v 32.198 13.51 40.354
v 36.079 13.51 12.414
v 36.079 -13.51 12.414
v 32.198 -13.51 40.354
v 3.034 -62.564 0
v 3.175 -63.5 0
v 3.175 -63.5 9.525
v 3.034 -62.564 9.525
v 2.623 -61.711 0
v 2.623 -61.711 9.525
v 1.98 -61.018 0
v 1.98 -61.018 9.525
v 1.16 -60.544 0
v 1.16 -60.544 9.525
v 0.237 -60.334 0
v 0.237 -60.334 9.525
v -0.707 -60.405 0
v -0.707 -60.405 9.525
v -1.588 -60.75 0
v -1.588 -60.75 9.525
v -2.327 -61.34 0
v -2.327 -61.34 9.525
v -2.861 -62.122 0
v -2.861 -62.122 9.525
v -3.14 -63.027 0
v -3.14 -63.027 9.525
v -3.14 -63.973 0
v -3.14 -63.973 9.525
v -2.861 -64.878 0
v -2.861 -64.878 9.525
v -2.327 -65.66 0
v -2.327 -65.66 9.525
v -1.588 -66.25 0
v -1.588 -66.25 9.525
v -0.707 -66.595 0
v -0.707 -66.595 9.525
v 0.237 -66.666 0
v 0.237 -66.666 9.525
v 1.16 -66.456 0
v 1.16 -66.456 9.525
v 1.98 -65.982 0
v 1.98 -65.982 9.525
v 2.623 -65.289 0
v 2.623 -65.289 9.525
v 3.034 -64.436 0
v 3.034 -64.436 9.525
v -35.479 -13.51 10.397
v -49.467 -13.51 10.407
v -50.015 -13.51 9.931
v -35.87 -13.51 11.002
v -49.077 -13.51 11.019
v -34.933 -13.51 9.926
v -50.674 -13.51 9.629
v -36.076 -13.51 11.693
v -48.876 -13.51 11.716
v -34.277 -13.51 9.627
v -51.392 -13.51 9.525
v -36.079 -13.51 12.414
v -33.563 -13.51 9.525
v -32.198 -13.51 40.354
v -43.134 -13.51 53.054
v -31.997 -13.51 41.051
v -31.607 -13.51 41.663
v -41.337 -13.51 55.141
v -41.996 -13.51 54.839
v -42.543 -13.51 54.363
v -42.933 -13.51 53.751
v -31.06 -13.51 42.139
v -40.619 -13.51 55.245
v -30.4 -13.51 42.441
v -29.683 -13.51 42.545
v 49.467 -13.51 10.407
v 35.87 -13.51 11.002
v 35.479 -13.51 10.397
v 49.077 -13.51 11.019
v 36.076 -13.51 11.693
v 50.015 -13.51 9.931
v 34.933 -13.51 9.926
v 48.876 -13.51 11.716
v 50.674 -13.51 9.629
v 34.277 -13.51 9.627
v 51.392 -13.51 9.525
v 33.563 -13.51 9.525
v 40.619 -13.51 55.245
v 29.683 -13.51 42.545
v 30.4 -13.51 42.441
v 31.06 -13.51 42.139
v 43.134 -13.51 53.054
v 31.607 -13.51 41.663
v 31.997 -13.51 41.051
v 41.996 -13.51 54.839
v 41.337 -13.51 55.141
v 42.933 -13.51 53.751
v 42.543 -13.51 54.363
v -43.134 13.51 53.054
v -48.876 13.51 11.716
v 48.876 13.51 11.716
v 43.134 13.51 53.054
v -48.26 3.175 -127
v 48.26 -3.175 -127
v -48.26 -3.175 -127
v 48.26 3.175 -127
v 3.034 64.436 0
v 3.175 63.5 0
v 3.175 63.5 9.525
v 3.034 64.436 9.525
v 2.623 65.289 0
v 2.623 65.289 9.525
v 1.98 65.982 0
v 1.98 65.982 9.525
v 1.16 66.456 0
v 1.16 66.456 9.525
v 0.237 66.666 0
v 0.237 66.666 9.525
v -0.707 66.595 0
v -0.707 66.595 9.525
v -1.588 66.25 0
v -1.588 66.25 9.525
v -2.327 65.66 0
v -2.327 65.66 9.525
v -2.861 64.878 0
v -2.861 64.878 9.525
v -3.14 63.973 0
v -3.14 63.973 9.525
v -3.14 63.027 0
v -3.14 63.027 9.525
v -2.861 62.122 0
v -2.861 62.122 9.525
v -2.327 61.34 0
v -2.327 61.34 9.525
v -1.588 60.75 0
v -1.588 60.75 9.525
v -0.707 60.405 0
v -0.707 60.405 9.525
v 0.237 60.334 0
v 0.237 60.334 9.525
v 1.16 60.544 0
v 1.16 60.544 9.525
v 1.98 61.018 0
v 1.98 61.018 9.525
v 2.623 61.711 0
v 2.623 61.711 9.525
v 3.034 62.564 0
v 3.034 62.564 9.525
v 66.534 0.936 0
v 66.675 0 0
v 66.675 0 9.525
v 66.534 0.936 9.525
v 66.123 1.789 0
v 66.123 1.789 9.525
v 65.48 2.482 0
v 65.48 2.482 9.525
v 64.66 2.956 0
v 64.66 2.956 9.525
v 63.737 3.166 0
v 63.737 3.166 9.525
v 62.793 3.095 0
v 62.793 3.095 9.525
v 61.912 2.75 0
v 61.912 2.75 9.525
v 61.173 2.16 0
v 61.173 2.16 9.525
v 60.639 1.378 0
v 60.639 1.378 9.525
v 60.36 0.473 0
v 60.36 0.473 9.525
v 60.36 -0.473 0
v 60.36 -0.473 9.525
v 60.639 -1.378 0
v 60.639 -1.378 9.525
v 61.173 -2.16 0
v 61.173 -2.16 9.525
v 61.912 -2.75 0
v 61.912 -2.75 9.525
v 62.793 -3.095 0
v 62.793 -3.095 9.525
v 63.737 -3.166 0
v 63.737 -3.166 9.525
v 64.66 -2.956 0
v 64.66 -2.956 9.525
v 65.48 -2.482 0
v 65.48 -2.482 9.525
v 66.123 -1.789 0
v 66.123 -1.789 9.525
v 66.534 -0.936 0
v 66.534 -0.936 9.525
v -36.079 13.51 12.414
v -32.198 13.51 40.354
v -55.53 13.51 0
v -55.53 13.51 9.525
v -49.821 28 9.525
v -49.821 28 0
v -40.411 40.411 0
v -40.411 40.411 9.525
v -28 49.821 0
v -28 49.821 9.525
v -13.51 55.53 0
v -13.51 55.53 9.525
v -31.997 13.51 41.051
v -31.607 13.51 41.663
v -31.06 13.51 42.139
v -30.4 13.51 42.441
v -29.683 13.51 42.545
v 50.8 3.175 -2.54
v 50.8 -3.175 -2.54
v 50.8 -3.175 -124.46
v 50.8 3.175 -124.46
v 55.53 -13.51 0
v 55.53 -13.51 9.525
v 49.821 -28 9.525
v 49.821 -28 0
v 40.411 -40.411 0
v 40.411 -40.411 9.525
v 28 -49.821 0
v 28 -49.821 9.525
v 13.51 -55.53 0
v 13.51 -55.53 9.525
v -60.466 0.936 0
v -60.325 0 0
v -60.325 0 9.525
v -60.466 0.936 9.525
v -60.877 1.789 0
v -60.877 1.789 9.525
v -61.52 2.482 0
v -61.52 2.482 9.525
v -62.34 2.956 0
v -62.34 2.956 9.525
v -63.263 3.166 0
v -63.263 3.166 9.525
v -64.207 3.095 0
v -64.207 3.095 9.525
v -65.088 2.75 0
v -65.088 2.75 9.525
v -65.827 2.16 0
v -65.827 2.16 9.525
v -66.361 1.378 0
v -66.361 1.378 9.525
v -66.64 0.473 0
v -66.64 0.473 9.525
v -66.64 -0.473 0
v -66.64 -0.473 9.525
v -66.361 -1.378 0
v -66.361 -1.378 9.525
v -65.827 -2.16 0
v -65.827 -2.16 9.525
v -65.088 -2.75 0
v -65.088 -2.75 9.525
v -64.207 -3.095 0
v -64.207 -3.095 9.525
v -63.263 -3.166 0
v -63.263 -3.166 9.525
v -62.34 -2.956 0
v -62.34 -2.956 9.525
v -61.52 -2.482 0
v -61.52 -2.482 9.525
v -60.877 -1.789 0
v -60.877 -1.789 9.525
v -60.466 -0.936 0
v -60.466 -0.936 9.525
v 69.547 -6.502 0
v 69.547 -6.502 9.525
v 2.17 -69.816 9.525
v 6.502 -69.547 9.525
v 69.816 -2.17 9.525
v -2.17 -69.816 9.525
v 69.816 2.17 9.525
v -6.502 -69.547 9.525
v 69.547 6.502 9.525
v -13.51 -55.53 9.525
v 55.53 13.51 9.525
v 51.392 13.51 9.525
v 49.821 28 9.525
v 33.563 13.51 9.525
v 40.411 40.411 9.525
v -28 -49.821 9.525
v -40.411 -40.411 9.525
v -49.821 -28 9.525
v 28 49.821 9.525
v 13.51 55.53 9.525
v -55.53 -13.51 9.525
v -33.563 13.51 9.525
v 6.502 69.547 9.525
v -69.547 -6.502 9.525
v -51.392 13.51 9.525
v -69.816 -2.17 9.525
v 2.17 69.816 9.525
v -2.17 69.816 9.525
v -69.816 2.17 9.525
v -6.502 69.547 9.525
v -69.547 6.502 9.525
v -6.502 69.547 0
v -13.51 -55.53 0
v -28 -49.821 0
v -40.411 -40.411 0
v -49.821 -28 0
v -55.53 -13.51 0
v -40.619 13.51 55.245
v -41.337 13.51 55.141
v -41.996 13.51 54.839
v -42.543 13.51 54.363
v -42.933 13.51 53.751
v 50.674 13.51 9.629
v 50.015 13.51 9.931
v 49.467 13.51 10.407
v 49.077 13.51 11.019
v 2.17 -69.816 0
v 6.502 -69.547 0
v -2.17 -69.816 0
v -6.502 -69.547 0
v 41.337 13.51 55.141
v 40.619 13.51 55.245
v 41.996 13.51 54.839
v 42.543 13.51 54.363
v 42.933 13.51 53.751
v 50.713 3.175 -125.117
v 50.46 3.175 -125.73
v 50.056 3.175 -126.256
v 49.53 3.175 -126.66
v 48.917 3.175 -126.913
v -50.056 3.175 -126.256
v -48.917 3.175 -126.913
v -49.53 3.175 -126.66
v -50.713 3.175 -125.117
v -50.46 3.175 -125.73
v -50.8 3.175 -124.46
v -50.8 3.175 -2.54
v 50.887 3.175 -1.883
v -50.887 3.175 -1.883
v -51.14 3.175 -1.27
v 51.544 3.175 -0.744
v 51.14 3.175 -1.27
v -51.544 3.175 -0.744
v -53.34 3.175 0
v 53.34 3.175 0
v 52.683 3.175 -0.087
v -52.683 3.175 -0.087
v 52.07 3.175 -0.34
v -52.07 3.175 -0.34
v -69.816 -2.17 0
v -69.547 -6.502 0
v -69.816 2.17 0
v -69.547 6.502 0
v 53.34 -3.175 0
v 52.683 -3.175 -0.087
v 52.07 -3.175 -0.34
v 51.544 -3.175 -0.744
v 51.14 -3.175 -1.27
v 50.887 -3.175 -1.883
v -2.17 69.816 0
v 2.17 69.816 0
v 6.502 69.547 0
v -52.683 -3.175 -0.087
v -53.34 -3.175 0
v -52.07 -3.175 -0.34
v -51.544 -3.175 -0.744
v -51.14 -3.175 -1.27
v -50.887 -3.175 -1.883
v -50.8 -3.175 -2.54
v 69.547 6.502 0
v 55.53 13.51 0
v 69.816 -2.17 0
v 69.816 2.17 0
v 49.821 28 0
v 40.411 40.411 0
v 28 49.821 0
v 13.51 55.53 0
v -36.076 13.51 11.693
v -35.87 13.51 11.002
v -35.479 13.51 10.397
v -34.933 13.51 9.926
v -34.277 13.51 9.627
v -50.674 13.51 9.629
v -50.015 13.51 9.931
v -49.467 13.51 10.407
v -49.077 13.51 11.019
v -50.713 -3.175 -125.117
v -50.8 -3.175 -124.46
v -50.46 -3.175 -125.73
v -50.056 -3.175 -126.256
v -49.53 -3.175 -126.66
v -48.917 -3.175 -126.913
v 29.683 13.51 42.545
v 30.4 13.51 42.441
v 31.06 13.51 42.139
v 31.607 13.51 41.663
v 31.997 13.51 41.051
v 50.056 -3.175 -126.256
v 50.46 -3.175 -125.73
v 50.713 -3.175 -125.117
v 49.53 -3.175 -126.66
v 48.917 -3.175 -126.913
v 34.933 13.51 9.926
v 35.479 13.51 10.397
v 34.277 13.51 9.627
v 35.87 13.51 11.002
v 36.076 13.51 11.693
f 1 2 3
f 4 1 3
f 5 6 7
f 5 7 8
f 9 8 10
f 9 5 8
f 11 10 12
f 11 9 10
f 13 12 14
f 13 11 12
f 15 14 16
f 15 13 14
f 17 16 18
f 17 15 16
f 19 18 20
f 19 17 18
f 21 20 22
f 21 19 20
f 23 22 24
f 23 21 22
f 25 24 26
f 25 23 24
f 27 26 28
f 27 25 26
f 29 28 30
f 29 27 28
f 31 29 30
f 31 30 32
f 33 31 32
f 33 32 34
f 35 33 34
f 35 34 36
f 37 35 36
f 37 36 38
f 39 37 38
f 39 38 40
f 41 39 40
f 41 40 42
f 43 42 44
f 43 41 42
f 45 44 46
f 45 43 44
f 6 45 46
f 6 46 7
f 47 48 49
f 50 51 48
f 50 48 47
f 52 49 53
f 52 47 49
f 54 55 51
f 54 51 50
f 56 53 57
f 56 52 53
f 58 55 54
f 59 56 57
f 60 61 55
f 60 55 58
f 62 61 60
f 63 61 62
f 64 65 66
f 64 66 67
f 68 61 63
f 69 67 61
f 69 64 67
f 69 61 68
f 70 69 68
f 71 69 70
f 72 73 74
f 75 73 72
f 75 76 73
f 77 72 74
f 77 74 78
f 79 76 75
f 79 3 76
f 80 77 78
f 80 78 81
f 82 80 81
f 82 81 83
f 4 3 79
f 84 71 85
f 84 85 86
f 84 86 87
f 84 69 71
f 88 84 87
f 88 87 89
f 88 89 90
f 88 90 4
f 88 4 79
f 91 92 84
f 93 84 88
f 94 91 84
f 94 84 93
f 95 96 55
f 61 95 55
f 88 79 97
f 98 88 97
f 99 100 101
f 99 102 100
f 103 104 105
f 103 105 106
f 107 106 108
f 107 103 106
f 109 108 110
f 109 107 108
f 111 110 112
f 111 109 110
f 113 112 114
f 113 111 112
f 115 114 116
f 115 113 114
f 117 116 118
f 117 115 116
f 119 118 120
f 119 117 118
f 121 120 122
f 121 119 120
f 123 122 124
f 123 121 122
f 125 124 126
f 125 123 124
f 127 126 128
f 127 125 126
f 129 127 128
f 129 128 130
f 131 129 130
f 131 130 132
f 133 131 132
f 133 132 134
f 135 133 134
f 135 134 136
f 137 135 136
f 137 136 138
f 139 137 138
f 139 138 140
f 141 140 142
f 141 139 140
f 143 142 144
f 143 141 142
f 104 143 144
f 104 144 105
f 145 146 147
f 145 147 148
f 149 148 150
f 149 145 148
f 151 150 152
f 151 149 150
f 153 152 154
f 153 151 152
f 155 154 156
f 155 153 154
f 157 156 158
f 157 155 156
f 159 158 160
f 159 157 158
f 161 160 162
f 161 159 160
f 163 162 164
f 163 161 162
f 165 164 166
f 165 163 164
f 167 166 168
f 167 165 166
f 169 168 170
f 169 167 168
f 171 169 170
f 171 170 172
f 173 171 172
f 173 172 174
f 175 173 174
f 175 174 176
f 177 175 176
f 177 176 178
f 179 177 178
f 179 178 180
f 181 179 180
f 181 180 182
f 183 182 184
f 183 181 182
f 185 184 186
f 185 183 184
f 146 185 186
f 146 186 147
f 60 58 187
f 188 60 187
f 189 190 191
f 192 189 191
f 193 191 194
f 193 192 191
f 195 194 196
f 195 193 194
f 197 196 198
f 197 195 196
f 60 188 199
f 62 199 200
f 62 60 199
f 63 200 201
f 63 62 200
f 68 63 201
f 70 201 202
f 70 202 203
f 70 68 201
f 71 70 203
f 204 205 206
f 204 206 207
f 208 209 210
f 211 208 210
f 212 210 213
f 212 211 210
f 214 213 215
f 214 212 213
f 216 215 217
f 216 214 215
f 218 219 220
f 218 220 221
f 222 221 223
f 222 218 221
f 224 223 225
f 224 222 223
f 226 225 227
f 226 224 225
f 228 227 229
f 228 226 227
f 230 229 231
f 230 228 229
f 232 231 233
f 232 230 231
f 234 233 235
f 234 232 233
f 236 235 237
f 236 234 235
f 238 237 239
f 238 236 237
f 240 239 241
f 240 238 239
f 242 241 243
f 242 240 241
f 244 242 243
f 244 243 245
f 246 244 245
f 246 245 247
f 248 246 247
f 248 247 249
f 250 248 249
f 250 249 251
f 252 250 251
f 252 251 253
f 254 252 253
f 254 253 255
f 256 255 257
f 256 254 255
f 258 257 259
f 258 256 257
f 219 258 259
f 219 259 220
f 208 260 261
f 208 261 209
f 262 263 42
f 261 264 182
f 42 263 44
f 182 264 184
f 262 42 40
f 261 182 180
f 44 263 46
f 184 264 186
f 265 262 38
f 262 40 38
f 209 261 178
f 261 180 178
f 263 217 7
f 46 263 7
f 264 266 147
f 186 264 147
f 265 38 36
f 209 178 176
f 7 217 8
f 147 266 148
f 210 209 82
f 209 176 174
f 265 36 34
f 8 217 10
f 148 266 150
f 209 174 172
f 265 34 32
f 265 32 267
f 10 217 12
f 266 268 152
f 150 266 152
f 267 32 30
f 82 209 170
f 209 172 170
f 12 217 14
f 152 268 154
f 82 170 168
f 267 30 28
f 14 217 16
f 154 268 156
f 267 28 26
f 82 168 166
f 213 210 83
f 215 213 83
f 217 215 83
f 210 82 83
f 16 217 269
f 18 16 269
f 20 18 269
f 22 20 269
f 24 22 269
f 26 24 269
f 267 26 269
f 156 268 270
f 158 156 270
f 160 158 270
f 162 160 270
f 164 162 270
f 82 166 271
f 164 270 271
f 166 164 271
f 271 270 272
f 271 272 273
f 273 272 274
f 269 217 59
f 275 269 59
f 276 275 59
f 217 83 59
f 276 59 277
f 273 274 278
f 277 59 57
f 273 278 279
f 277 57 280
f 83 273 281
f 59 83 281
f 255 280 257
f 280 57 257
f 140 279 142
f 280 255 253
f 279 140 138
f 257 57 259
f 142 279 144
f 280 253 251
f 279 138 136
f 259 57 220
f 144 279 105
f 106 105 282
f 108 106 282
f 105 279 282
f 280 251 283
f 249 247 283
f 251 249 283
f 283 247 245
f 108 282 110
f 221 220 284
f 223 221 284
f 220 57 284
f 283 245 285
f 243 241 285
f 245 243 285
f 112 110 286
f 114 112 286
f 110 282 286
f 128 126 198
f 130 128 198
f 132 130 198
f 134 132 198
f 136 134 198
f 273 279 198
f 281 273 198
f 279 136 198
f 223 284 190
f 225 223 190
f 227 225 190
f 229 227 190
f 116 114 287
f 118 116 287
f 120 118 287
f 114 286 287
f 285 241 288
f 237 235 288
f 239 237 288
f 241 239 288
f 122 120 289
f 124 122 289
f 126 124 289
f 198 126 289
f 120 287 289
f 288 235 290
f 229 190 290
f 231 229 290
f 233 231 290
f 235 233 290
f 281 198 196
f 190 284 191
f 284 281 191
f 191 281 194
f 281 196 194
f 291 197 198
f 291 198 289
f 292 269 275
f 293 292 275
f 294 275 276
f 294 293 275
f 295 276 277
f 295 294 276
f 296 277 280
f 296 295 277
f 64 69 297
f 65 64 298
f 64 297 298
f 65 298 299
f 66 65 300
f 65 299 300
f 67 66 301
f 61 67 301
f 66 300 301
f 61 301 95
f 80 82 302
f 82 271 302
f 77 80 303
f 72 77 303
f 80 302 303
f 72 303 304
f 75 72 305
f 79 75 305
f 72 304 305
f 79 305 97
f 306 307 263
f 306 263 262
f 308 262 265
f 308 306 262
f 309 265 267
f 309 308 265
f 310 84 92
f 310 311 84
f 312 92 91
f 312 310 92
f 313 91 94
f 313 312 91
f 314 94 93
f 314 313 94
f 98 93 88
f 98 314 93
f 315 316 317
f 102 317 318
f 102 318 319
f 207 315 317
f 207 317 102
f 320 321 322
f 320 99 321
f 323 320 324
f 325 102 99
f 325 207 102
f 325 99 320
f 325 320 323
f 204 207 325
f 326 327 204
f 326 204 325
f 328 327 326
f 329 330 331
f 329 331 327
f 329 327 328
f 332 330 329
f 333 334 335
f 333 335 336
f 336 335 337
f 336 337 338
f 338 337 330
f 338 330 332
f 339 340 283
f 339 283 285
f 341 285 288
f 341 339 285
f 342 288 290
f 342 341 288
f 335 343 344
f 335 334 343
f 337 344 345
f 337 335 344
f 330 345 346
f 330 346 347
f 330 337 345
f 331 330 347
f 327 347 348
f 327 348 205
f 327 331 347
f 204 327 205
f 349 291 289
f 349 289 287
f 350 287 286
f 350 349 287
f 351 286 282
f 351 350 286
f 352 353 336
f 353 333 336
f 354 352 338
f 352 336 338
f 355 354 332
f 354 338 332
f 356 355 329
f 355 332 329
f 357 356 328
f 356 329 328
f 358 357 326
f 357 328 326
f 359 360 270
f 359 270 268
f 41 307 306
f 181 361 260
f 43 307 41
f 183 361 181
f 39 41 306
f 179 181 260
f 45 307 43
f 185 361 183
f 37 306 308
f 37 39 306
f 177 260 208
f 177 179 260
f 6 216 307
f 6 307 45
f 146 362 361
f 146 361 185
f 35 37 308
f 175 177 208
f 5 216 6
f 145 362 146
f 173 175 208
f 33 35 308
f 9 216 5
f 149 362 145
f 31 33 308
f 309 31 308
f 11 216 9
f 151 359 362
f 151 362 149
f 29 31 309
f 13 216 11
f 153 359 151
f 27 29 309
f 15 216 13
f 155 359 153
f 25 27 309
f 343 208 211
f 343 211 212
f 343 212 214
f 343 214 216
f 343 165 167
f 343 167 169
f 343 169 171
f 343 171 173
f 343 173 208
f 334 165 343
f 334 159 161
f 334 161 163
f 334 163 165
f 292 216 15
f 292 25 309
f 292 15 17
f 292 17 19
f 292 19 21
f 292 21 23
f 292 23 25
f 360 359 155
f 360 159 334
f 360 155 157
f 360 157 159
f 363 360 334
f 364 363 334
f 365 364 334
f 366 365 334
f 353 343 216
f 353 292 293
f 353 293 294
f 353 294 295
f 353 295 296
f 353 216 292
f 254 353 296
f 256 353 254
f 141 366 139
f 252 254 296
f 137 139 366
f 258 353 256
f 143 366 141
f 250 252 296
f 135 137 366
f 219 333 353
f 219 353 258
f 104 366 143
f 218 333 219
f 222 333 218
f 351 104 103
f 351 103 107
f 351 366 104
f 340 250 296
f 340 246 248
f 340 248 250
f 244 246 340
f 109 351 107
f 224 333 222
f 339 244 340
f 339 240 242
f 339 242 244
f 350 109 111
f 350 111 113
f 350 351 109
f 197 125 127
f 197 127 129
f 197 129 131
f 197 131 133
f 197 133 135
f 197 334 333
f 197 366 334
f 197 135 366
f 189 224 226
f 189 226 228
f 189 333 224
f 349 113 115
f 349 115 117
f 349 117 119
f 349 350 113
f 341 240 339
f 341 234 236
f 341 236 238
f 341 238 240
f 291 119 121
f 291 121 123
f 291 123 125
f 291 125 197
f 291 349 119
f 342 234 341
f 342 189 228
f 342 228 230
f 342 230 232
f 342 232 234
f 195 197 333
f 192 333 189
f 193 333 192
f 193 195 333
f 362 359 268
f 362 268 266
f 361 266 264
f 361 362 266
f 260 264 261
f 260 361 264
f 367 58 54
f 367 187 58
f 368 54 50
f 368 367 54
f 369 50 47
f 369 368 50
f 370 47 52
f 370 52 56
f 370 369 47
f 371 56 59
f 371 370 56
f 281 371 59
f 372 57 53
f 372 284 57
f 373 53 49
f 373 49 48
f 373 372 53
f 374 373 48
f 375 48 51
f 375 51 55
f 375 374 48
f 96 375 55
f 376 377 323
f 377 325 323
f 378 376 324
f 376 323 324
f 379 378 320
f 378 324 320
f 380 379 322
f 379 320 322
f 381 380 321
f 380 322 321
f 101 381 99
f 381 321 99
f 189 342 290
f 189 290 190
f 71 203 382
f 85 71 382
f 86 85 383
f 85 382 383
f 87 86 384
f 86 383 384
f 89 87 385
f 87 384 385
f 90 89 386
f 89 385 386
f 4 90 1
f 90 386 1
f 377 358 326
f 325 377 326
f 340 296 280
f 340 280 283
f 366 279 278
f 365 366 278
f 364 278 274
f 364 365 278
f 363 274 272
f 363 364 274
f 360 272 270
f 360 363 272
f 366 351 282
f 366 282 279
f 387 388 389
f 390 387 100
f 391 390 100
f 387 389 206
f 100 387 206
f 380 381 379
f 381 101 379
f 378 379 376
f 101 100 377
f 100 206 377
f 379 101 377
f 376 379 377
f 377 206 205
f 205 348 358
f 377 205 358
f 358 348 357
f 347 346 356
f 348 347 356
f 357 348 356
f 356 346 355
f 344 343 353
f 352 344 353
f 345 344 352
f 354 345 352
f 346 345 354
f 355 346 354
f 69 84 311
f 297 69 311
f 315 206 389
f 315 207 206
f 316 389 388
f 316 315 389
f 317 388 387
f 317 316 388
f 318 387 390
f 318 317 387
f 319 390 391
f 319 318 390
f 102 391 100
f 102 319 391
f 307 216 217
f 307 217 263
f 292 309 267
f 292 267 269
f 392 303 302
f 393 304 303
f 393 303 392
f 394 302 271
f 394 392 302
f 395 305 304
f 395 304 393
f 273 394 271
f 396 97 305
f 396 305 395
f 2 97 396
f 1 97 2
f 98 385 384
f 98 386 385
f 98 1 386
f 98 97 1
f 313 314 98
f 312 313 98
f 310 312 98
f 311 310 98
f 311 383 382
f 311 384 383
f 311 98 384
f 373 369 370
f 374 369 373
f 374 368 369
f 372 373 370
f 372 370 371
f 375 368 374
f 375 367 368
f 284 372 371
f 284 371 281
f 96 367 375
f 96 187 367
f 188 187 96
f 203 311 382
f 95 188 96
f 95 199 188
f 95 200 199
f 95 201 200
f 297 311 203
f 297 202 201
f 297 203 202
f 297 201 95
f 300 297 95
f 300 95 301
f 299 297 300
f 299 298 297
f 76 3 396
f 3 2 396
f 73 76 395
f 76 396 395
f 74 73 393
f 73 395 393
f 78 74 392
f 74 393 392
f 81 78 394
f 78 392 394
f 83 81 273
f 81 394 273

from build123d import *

# Parameters (mm, degrees)
SKETCH2_R           = 3.175
BOSS_EXTRUDE1_DEPTH = 9.525
SKETCH4_W           = 12.7
SKETCH4_H           = 27.0197796
SKETCH9_W           = 12.7
SKETCH9_H           = 27.0197796
SKETCH4_86_W        = 12.7
SKETCH4_86_H        = 27.0197796
SKETCH9_5_W         = 12.7
SKETCH9_5_H         = 27.0197796
SKETCH11_W          = 85.660440798
SKETCH11_H          = 27.0197796
BOSS_EXTRUDE3_DEPTH = 12.7
FILLET2_R           = 2.54
SKETCH12_W          = 101.6
SKETCH12_H          = 6.35
BOSS_EXTRUDE4_DEPTH = 127
FILLET4_R           = 2.54


with BuildPart() as part:
    # Sketch2 → Boss-Extrude1 (new body)
    with BuildSketch(Plane.XY):
        with BuildLine():
            Line((6.501621467, 69.546757065), (13.5098898, 55.530220399))
            ThreePointArc((13.5098898, 55.530220399), (40.411152545, 40.411152545), (55.530220399, 13.5098898))
            Line((55.530220399, 13.5098898), (69.546757065, 6.501621467))
            ThreePointArc((69.546757065, 6.501621467), (69.85, 0), (69.546757065, -6.501621467))
            Line((69.546757065, -6.501621467), (55.530220399, -13.5098898))
            ThreePointArc((55.530220399, -13.5098898), (40.411152545, -40.411152545), (13.5098898, -55.530220399))
            Line((13.5098898, -55.530220399), (6.501621467, -69.546757065))
            ThreePointArc((6.501621467, -69.546757065), (0, -69.85), (-6.501621467, -69.546757065))
            Line((-6.501621467, -69.546757065), (-13.5098898, -55.530220399))
            ThreePointArc((-13.5098898, -55.530220399), (-40.411152545, -40.411152545), (-55.530220399, -13.5098898))
            Line((-55.530220399, -13.5098898), (-69.546757065, -6.501621467))
            ThreePointArc((-69.546757065, -6.501621467), (-69.85, 0), (-69.546757065, 6.501621467))
            Line((-69.546757065, 6.501621467), (-55.530220399, 13.5098898))
            ThreePointArc((-55.530220399, 13.5098898), (-40.411152545, 40.411152545), (-13.5098898, 55.530220399))
            Line((-13.5098898, 55.530220399), (-6.501621467, 69.546757065))
            ThreePointArc((-6.501621467, 69.546757065), (0, 69.85), (6.501621467, 69.546757065))
        make_face()
        with Locations((-63.5, 0)):
            Circle(SKETCH2_R, mode=Mode.SUBTRACT)
        with Locations((0, 63.5)):
            Circle(SKETCH2_R, mode=Mode.SUBTRACT)
        with Locations((63.5, 0)):
            Circle(SKETCH2_R, mode=Mode.SUBTRACT)
        with Locations((0, -63.5)):
            Circle(SKETCH2_R, mode=Mode.SUBTRACT)
    extrude(amount=BOSS_EXTRUDE1_DEPTH)

    # Sketch4 → Loft5 section 0
    with BuildSketch(Plane.XY.offset(9.525)):
        with Locations((-42.830220399, 0)):
            Rectangle(SKETCH4_W, SKETCH4_H)
    # Sketch9 → Loft5 section 1
    with BuildSketch(Plane.XY.offset(55.245)):
        with Locations((-36.480220399, 0)):
            Rectangle(SKETCH9_W, SKETCH9_H)
    loft()

    # Sketch4<86> → Loft6 section 0
    with BuildSketch(Plane.XY.offset(9.525)):
        with Locations((42.830220399, 0)):
            Rectangle(SKETCH4_86_W, SKETCH4_86_H)
    # Sketch9<5> → Loft6 section 1
    with BuildSketch(Plane.XY.offset(55.245)):
        with Locations((36.480220399, 0)):
            Rectangle(SKETCH9_5_W, SKETCH9_5_H)
    loft()

    # Sketch11 → Boss-Extrude3 (add)
    with BuildSketch(Plane.XY.offset(55.245)):
        Rectangle(SKETCH11_W, SKETCH11_H)
    extrude(amount=-BOSS_EXTRUDE3_DEPTH)

    # Fillet2
    fillet2_edges = [part.edges().sort_by_distance(p)[0] for p in [
        (-31.894109288, 0, 42.545),
        (31.894109288, 0, 42.545),
        (-42.830220399, 0, 55.245),
        (-49.180220399, 0, 9.525),
        (-36.480220399, 0, 9.525),
        (36.480220399, 0, 9.525),
        (42.830220399, 0, 55.245),
        (49.180220399, 0, 9.525),
    ]]
    fillet(fillet2_edges, radius=FILLET2_R)

    # Sketch12 → Boss-Extrude4 (add)
    with BuildSketch(Plane(origin=(0, 0, 0), x_dir=(-1, 0, 0), z_dir=(0, 0, -1))):
        Rectangle(SKETCH12_W, SKETCH12_H)
    extrude(amount=BOSS_EXTRUDE4_DEPTH)

    # Fillet4
    fillet4_edges = [part.edges().sort_by_distance(p)[0] for p in [
        (-50.8, 0, 0),
        (50.8, 0, 0),
        (-50.8, 0, -127),
        (50.8, 0, -127),
    ]]
    fillet(fillet4_edges, radius=FILLET4_R)


solid = part.part
